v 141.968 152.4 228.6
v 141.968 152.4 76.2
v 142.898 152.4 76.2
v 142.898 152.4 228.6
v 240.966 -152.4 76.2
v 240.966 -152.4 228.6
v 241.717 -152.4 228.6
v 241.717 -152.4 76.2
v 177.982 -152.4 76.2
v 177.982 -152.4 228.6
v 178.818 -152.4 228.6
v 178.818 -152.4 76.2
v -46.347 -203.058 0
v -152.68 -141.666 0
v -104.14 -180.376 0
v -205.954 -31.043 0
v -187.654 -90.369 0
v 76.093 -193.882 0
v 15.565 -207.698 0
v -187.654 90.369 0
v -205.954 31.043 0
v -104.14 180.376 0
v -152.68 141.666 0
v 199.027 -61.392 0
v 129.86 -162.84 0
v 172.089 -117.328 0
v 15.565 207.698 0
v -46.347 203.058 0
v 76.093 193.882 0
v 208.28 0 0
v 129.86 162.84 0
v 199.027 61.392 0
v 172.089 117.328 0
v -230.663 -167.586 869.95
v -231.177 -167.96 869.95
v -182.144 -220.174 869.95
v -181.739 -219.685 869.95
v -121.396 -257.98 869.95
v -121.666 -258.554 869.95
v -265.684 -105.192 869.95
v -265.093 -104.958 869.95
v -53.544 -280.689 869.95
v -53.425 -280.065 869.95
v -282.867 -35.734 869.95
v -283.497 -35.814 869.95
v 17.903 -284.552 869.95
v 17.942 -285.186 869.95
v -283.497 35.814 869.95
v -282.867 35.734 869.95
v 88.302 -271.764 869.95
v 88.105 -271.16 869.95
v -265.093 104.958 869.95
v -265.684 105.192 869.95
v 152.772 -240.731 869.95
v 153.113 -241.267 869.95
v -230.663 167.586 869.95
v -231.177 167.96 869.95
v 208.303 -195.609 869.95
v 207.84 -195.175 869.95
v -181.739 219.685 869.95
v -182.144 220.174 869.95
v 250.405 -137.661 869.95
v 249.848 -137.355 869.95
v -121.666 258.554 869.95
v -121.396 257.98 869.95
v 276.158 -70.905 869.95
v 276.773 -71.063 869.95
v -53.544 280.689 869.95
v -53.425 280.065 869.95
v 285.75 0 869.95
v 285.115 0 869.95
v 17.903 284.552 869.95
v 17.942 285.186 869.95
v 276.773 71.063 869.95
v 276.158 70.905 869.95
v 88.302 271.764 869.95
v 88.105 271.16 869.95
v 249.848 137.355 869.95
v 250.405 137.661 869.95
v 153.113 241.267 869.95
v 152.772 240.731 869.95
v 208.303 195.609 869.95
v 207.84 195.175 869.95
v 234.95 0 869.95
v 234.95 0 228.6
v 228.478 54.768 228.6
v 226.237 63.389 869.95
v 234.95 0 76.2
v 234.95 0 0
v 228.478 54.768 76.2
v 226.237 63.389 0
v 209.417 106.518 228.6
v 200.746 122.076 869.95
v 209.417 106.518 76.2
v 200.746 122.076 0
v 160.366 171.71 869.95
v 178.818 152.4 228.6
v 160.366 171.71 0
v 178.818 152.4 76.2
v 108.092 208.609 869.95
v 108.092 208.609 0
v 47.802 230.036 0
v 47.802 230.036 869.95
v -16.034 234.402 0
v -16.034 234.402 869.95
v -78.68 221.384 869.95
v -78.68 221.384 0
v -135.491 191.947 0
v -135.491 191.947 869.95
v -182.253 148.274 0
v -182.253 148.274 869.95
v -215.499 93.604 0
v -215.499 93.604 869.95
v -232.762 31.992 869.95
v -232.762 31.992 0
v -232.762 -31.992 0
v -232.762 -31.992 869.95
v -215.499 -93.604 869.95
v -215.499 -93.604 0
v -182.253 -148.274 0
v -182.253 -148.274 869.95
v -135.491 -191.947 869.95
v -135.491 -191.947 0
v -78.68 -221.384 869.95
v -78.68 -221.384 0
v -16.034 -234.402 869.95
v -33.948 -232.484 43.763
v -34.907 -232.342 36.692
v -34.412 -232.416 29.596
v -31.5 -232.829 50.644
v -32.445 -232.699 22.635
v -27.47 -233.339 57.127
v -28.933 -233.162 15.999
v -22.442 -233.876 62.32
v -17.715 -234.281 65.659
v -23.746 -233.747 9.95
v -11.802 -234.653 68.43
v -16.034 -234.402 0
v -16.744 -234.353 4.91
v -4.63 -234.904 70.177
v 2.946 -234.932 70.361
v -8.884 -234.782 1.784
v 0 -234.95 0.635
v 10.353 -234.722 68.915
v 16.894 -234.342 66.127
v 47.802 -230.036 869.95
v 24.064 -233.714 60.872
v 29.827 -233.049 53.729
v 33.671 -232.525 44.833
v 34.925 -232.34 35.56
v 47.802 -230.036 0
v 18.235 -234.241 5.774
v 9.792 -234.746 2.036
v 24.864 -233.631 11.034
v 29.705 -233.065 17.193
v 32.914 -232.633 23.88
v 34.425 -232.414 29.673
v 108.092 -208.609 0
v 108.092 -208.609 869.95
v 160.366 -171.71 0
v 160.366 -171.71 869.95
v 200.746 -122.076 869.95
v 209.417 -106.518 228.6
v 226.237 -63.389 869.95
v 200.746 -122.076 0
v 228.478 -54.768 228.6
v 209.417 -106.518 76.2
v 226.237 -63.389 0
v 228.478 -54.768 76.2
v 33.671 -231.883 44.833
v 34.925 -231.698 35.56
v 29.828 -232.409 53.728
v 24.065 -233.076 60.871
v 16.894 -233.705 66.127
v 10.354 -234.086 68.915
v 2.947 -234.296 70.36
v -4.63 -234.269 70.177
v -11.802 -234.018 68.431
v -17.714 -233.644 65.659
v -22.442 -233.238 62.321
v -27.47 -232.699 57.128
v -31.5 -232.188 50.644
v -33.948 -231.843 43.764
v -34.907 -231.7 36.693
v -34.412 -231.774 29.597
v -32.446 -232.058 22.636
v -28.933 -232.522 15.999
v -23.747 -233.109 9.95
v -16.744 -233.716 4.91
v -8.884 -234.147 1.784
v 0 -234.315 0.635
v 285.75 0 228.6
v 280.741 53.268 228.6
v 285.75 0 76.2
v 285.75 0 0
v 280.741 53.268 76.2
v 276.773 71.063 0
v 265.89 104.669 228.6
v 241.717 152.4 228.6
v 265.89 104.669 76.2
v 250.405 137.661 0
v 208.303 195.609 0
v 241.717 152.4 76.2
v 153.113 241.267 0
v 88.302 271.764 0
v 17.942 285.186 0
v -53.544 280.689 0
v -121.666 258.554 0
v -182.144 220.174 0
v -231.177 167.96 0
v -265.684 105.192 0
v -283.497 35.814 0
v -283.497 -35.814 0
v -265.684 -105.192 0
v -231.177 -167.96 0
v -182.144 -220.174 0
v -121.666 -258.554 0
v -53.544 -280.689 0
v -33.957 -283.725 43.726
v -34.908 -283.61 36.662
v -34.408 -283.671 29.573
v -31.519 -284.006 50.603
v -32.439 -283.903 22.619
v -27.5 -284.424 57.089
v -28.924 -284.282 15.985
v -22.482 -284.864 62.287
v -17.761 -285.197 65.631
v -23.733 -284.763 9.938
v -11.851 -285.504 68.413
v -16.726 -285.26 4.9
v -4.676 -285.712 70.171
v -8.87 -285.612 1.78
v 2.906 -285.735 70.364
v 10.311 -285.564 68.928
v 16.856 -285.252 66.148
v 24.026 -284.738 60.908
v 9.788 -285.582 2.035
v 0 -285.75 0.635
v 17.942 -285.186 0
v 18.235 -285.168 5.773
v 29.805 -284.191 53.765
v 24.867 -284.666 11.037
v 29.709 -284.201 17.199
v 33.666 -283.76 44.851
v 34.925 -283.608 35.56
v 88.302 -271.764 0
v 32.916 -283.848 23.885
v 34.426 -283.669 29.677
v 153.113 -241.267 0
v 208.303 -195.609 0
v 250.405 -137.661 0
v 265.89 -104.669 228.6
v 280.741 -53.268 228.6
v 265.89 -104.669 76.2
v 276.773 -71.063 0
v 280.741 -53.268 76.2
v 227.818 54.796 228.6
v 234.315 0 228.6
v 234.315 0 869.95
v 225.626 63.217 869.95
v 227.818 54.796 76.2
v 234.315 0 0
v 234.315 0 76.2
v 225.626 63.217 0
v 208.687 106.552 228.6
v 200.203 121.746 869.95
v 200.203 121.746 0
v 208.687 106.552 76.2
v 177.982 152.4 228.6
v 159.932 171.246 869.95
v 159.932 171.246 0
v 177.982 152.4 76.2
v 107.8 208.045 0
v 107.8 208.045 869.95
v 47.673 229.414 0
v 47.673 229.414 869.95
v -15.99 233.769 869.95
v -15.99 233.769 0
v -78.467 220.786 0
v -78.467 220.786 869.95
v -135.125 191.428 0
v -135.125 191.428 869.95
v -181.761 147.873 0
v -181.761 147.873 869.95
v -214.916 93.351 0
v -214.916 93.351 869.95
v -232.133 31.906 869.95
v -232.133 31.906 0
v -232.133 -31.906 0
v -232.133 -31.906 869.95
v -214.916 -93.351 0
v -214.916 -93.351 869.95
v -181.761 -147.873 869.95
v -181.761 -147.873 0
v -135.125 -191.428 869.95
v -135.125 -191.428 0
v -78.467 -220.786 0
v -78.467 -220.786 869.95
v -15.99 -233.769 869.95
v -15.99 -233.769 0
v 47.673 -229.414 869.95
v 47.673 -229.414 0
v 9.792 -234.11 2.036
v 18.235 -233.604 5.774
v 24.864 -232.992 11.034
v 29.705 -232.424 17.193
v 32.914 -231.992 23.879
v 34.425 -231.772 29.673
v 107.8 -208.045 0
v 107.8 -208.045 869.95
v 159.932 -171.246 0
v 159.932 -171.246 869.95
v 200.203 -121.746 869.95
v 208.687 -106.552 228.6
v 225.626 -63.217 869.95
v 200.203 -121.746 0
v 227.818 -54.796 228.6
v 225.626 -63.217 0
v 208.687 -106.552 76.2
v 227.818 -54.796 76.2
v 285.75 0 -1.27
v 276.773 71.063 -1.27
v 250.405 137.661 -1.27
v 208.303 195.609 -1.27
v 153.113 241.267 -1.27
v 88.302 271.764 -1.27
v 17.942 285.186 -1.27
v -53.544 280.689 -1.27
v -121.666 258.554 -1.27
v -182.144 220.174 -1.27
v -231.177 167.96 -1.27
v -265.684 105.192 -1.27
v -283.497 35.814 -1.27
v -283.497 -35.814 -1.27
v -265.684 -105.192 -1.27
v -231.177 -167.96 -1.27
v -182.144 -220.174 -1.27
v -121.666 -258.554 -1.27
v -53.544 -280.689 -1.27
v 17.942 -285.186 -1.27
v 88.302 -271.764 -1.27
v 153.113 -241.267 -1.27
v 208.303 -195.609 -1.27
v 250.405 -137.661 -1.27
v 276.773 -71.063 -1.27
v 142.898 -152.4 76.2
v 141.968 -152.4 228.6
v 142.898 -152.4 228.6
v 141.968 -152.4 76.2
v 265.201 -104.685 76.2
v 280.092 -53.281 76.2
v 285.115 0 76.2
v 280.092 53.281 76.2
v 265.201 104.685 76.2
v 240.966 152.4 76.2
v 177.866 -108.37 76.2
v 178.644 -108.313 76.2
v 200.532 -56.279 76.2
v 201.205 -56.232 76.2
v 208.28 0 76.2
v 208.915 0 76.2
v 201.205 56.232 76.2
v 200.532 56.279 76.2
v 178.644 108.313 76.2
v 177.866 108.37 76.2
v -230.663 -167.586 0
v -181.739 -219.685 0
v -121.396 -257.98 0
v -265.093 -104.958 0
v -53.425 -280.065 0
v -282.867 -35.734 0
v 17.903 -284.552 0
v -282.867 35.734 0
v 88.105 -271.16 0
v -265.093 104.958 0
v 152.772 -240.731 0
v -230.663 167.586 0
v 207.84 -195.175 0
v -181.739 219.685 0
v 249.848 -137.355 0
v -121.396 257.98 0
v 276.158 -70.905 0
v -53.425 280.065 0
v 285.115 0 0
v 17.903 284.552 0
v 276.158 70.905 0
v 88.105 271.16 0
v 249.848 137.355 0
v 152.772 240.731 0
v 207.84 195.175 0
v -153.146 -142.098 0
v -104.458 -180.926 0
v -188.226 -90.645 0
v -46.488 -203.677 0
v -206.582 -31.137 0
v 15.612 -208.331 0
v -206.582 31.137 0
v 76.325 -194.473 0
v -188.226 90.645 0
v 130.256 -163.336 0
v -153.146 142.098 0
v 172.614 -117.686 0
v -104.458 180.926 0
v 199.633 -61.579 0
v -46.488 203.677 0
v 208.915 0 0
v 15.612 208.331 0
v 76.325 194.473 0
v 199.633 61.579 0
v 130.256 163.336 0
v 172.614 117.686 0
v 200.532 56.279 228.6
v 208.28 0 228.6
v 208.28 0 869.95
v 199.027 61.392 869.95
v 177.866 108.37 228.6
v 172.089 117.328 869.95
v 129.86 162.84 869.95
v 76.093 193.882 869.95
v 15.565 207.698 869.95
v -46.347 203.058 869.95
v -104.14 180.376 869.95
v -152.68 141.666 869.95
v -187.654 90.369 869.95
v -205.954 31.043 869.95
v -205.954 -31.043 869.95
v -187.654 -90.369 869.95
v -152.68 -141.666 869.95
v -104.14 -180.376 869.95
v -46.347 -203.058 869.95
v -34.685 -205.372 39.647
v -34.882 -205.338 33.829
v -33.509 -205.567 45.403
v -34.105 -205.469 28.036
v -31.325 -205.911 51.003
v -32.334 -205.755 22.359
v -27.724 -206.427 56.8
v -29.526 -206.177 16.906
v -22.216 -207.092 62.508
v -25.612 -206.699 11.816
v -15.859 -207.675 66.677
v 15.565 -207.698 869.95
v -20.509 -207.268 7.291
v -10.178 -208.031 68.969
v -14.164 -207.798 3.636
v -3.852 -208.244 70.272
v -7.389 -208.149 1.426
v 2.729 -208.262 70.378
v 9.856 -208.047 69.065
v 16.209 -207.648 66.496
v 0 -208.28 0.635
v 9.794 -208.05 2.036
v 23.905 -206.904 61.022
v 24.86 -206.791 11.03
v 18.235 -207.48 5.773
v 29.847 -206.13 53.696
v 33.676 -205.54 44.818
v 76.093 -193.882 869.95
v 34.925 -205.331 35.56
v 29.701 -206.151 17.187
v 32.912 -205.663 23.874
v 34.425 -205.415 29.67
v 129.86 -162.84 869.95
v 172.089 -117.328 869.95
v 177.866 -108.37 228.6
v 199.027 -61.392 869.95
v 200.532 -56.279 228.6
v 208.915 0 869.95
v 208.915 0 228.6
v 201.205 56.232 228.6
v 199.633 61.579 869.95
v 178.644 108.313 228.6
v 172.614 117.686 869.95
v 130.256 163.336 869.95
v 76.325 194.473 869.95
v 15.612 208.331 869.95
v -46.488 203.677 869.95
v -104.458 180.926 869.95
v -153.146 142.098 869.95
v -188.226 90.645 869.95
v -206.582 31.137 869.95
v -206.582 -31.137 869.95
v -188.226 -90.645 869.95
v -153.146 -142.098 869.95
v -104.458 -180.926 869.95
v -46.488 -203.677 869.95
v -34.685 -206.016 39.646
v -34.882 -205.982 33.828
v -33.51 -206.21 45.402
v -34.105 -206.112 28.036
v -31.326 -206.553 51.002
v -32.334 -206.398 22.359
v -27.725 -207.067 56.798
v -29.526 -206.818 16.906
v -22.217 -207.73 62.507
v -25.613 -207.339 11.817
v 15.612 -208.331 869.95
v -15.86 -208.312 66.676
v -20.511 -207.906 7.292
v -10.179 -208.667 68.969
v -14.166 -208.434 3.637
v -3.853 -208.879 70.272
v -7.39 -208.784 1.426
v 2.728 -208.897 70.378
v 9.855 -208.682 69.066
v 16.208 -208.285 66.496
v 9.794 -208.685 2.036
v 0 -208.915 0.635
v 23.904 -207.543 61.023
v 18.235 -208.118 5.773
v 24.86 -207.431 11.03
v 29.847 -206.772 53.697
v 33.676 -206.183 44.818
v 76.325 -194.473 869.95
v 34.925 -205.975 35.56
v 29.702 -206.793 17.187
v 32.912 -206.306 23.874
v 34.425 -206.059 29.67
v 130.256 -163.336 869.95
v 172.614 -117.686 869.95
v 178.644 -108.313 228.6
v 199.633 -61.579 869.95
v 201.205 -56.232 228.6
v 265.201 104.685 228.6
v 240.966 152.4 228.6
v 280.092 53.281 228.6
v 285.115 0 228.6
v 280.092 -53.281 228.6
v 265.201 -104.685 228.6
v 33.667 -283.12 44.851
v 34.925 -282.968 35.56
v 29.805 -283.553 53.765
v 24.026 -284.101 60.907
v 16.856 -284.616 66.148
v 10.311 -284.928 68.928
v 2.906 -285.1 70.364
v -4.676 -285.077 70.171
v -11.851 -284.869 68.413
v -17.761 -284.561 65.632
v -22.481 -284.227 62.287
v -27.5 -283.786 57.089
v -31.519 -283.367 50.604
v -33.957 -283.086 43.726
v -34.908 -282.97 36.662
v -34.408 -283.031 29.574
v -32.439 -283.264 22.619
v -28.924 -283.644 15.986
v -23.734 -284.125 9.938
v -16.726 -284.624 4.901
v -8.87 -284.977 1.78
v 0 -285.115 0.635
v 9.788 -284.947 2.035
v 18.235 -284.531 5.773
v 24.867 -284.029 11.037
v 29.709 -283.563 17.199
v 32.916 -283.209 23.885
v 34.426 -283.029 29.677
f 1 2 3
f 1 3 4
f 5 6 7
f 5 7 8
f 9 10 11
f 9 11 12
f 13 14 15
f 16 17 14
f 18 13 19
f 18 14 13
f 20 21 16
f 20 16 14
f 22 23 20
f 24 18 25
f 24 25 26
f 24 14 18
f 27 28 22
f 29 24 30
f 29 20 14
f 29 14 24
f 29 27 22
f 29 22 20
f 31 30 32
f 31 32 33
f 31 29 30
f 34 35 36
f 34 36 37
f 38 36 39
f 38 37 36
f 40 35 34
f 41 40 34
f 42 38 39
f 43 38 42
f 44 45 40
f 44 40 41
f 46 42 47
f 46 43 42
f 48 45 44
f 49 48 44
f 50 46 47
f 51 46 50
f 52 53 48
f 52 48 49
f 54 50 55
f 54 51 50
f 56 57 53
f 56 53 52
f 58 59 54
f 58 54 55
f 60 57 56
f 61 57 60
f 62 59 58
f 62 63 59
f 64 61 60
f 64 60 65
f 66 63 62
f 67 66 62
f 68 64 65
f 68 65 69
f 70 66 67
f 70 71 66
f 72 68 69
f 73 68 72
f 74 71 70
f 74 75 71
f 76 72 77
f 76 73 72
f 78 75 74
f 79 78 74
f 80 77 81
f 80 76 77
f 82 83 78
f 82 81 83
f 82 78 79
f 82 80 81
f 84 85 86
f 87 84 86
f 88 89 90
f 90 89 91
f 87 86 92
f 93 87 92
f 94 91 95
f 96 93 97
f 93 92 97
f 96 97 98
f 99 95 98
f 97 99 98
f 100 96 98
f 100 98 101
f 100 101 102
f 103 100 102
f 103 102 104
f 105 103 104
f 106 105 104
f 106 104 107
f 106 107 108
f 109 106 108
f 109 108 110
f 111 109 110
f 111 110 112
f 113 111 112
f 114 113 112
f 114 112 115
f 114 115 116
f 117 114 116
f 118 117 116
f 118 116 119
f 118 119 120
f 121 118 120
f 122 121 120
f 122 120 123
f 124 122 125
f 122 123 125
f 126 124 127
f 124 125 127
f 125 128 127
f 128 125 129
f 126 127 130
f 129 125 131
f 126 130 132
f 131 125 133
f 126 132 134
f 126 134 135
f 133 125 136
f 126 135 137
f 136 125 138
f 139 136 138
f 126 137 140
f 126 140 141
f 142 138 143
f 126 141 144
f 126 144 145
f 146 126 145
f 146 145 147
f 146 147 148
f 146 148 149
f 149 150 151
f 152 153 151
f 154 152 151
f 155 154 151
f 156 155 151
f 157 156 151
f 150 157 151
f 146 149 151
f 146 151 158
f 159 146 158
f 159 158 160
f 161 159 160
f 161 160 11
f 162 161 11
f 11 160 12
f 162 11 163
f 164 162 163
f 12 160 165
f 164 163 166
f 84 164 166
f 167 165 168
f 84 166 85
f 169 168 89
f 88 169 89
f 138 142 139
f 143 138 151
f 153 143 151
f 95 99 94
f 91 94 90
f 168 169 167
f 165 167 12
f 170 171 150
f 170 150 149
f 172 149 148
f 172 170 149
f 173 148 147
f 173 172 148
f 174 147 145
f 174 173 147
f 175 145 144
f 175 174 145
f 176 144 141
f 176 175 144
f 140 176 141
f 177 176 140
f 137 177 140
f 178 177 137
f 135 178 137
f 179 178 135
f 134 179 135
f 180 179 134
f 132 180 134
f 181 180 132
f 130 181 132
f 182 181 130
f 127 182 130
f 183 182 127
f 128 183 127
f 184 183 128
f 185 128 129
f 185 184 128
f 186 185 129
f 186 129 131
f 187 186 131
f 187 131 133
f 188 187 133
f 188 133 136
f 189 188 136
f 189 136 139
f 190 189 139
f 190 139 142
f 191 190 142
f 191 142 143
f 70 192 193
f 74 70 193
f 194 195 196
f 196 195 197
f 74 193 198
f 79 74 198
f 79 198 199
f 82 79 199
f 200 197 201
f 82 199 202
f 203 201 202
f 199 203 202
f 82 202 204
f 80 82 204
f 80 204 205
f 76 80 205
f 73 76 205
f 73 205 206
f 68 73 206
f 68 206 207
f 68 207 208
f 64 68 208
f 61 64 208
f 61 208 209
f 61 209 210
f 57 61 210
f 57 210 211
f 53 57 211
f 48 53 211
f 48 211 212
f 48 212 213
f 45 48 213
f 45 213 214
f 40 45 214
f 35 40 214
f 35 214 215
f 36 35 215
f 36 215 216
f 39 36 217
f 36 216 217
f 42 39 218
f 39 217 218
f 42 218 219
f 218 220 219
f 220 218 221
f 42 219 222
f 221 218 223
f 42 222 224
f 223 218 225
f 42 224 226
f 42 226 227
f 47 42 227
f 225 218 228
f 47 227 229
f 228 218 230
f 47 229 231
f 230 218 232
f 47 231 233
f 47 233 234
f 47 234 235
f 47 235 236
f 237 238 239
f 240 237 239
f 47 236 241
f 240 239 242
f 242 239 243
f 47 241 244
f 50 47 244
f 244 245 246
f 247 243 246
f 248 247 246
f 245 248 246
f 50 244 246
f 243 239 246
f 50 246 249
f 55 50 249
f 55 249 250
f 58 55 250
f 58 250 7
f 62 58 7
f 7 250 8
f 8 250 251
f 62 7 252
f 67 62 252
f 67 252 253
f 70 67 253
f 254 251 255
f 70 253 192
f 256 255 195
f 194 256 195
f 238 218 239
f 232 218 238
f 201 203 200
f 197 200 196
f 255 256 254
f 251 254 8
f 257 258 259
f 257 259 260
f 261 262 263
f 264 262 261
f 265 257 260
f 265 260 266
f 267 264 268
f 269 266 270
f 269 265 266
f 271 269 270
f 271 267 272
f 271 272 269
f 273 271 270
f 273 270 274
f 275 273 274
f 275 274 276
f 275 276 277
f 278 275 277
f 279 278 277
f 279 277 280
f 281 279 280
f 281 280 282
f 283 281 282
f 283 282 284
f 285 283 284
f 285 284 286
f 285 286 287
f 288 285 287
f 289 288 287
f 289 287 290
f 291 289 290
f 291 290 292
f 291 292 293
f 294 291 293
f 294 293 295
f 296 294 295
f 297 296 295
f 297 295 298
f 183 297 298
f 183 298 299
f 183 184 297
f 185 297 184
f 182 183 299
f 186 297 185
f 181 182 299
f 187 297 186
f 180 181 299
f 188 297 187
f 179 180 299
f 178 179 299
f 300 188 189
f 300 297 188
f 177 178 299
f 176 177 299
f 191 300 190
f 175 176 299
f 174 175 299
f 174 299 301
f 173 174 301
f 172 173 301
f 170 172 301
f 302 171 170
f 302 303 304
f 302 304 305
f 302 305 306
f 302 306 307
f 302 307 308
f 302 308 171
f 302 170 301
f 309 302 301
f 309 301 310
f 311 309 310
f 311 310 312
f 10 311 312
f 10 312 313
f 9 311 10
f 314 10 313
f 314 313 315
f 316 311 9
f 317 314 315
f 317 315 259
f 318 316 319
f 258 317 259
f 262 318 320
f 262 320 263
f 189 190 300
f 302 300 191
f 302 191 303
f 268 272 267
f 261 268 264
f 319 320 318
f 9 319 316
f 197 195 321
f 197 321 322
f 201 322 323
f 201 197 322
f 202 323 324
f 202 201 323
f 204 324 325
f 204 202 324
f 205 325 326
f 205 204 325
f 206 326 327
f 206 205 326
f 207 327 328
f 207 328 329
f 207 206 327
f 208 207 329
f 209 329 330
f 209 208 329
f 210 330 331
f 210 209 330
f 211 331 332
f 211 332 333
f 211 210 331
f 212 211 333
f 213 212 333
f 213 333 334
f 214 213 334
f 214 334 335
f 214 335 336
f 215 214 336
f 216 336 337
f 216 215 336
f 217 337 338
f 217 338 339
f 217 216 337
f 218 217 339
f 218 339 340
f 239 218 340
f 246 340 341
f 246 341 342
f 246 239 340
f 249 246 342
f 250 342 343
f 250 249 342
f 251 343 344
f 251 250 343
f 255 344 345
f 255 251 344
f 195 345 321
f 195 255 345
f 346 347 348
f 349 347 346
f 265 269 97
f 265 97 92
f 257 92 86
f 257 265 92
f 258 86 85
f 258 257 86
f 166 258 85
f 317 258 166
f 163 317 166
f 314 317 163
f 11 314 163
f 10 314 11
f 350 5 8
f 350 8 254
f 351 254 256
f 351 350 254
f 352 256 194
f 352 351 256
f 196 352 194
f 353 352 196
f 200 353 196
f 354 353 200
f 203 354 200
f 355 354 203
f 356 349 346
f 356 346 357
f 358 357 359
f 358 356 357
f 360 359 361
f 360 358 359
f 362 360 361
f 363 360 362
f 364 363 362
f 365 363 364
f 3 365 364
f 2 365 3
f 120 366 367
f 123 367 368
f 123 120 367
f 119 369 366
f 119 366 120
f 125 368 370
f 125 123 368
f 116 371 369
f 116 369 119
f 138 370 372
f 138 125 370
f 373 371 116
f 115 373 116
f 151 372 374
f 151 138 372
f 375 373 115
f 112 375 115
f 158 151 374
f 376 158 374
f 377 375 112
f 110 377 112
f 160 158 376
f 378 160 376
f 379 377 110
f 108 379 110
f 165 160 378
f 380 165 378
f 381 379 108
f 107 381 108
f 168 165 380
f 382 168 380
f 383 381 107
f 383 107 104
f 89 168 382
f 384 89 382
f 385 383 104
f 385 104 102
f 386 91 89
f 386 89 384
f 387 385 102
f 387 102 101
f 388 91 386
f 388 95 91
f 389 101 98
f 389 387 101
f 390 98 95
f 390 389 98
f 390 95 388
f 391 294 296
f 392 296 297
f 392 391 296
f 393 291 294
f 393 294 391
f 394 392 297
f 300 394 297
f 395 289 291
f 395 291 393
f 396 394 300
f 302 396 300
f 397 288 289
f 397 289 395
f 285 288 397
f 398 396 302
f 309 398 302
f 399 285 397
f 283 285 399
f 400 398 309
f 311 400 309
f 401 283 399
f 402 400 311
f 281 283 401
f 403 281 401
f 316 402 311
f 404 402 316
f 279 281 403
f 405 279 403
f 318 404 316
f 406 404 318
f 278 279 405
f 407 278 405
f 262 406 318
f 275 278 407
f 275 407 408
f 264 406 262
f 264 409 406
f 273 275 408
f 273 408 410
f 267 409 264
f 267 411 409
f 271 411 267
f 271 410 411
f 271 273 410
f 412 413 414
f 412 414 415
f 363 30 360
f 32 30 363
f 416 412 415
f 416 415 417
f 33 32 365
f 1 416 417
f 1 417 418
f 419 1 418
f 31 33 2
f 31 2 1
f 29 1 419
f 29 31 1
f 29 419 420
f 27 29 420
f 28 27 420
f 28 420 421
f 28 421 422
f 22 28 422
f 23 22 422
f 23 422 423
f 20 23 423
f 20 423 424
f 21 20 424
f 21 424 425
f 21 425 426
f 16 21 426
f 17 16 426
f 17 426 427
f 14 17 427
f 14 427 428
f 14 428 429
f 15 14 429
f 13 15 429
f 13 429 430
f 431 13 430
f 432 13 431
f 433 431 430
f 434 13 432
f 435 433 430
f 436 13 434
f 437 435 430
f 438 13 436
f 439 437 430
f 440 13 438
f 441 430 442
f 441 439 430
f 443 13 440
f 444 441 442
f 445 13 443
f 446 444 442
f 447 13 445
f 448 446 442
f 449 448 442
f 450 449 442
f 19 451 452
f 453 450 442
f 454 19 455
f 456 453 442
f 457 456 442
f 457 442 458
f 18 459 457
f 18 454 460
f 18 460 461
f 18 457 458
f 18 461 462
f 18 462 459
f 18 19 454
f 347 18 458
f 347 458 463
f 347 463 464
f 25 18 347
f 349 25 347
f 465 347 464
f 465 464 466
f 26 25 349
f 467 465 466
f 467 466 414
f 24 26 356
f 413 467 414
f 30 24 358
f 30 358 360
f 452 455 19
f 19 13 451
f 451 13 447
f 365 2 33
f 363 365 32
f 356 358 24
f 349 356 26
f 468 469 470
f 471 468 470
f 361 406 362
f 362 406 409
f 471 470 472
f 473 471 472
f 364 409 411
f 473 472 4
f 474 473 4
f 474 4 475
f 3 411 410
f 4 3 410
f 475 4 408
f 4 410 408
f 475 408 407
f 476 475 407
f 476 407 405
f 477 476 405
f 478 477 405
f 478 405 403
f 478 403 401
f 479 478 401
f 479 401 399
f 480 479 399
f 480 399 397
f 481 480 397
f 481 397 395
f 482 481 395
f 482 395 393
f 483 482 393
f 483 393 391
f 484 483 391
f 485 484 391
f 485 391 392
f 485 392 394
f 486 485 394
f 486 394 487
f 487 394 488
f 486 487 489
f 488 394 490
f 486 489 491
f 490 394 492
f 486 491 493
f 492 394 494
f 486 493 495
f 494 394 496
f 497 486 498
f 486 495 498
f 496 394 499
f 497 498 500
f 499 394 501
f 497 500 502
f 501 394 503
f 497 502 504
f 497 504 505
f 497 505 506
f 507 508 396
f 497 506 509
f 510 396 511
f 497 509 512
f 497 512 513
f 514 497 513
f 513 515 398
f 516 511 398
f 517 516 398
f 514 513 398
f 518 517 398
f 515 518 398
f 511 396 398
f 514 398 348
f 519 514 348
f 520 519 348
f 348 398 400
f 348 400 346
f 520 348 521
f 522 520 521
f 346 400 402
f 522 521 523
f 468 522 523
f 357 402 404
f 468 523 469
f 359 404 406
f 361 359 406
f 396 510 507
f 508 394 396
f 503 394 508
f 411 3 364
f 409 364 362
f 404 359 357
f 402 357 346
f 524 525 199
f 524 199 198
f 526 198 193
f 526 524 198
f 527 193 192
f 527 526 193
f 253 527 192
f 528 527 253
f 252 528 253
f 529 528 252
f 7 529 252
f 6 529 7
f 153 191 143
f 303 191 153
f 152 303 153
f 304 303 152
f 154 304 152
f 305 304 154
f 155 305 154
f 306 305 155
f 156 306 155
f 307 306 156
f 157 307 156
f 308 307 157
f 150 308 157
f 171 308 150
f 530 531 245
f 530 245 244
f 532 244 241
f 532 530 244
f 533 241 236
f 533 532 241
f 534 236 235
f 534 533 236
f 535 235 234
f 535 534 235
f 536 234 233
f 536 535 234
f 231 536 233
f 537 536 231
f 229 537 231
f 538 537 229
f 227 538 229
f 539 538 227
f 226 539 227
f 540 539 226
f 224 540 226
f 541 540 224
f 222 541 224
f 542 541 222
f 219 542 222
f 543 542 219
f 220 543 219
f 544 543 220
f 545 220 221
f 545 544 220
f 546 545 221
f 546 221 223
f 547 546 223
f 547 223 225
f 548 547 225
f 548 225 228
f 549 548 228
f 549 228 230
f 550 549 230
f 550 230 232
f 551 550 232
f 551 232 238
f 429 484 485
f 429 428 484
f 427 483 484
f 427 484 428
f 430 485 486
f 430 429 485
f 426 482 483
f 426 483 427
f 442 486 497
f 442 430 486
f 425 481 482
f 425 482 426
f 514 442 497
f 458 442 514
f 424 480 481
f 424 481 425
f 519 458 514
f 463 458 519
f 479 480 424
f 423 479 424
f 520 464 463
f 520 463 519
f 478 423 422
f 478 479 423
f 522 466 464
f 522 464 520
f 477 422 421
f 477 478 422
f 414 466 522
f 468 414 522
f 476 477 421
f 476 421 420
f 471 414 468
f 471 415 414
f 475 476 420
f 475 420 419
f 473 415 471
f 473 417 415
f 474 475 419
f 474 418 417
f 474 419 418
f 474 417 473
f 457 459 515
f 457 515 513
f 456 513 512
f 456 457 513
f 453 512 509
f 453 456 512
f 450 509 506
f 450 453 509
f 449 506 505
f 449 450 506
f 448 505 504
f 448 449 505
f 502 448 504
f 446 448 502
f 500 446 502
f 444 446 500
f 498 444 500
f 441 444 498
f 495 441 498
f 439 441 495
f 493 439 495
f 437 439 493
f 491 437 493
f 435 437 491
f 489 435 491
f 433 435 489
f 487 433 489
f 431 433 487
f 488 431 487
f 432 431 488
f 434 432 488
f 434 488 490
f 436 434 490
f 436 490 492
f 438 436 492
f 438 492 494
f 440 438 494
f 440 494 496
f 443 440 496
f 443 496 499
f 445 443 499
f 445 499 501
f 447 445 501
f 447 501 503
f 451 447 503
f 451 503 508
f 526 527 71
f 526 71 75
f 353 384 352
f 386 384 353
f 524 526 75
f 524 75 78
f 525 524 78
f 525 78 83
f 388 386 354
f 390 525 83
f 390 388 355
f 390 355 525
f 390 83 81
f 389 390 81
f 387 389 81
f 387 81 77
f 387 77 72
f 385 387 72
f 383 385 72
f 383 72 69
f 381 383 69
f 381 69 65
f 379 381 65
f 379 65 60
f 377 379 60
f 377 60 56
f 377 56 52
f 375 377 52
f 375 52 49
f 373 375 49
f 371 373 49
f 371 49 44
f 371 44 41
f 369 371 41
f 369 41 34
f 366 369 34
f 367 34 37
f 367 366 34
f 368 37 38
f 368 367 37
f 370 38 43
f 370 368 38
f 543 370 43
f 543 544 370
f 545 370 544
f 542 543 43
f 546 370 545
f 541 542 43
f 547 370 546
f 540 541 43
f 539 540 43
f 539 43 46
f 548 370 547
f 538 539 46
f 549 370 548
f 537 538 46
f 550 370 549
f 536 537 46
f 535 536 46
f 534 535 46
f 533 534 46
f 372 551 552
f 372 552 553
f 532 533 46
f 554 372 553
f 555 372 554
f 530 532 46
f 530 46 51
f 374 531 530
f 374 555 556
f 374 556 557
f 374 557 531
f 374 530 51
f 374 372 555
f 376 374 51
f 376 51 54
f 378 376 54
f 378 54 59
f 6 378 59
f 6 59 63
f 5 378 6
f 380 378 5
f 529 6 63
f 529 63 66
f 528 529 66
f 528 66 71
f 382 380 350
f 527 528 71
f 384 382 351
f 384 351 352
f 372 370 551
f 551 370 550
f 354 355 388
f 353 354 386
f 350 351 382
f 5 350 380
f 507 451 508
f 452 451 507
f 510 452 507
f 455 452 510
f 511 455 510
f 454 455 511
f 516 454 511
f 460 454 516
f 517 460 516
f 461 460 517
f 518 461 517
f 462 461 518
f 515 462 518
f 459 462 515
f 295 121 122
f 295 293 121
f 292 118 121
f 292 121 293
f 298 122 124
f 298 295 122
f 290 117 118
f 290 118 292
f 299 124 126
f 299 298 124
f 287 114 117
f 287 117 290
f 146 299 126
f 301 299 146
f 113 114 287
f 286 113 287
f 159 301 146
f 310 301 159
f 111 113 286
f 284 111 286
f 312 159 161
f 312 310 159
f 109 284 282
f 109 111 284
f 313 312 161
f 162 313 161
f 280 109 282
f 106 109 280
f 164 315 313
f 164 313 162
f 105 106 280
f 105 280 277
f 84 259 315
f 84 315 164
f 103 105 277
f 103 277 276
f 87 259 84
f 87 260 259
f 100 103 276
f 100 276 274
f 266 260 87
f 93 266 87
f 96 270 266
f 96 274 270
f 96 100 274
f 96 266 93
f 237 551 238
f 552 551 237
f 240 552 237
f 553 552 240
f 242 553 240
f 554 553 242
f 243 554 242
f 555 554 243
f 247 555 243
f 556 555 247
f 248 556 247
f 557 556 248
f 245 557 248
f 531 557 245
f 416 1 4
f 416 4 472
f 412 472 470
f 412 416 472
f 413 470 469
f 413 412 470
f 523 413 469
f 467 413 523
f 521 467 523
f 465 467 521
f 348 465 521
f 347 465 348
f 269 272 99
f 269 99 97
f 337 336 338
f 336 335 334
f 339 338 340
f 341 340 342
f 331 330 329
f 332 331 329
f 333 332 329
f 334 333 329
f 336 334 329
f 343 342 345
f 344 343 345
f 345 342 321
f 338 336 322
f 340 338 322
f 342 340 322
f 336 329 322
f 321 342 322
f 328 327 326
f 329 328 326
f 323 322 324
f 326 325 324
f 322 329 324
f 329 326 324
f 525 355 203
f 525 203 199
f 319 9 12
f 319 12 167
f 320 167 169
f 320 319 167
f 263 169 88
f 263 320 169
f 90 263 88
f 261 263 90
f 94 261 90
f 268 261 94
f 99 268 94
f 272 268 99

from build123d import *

# Parameters (mm, degrees)
F0_R      = 285.75
F1_DEPTH  = 1.27
F2_R      = 285.75
F2_R_2    = 285.115
F3_DEPTH  = 869.95
F4_R      = 234.95
F4_R_2    = 234.315
F5_DEPTH  = 869.95
F6_R      = 208.915
F6_R_2    = 208.28
F7_DEPTH  = 869.95
F9_DEPTH  = 285.751
F11_DEPTH = 304.8


with BuildPart() as f1:
    # F0 (on Top) → F1 (new body)
    with BuildSketch(Plane.XY):
        Circle(F0_R)
    extrude(amount=-F1_DEPTH)

    # F2 (on face) → F3 (join)
    with BuildSketch(Plane.XY):
        Circle(F2_R)
        Circle(F2_R_2, mode=Mode.SUBTRACT)
    extrude(amount=F3_DEPTH)

    # F4 (on face) → F5 (join)
    with BuildSketch(Plane.XY):
        Circle(F4_R)
        Circle(F4_R_2, mode=Mode.SUBTRACT)
    extrude(amount=F5_DEPTH)

    # F6 (on face) → F7 (join)
    with BuildSketch(Plane.XY):
        Circle(F6_R)
        Circle(F6_R_2, mode=Mode.SUBTRACT)
    extrude(amount=F7_DEPTH)

    # F8 (on Front) → F9 (cut, through all)
    with BuildSketch(Plane.XZ):
        with BuildLine():
            ThreePointArc((0, 0.635), (24.695704, 10.864296), (34.925, 35.56))
            ThreePointArc((34.925, 35.56), (-24.695704, 60.255704), (0, 0.635))
        make_face()
    extrude(amount=F9_DEPTH, mode=Mode.SUBTRACT)

    # F10 (on Right) → F11 (cut)
    with BuildSketch(Plane.YZ):
        Polygon((-152.4, 76.2), (0, 76.2), (152.4, 76.2), (152.4, 228.6), (-152.4, 228.6), align=None)
    extrude(amount=F11_DEPTH, mode=Mode.SUBTRACT)


solid = f1.part
